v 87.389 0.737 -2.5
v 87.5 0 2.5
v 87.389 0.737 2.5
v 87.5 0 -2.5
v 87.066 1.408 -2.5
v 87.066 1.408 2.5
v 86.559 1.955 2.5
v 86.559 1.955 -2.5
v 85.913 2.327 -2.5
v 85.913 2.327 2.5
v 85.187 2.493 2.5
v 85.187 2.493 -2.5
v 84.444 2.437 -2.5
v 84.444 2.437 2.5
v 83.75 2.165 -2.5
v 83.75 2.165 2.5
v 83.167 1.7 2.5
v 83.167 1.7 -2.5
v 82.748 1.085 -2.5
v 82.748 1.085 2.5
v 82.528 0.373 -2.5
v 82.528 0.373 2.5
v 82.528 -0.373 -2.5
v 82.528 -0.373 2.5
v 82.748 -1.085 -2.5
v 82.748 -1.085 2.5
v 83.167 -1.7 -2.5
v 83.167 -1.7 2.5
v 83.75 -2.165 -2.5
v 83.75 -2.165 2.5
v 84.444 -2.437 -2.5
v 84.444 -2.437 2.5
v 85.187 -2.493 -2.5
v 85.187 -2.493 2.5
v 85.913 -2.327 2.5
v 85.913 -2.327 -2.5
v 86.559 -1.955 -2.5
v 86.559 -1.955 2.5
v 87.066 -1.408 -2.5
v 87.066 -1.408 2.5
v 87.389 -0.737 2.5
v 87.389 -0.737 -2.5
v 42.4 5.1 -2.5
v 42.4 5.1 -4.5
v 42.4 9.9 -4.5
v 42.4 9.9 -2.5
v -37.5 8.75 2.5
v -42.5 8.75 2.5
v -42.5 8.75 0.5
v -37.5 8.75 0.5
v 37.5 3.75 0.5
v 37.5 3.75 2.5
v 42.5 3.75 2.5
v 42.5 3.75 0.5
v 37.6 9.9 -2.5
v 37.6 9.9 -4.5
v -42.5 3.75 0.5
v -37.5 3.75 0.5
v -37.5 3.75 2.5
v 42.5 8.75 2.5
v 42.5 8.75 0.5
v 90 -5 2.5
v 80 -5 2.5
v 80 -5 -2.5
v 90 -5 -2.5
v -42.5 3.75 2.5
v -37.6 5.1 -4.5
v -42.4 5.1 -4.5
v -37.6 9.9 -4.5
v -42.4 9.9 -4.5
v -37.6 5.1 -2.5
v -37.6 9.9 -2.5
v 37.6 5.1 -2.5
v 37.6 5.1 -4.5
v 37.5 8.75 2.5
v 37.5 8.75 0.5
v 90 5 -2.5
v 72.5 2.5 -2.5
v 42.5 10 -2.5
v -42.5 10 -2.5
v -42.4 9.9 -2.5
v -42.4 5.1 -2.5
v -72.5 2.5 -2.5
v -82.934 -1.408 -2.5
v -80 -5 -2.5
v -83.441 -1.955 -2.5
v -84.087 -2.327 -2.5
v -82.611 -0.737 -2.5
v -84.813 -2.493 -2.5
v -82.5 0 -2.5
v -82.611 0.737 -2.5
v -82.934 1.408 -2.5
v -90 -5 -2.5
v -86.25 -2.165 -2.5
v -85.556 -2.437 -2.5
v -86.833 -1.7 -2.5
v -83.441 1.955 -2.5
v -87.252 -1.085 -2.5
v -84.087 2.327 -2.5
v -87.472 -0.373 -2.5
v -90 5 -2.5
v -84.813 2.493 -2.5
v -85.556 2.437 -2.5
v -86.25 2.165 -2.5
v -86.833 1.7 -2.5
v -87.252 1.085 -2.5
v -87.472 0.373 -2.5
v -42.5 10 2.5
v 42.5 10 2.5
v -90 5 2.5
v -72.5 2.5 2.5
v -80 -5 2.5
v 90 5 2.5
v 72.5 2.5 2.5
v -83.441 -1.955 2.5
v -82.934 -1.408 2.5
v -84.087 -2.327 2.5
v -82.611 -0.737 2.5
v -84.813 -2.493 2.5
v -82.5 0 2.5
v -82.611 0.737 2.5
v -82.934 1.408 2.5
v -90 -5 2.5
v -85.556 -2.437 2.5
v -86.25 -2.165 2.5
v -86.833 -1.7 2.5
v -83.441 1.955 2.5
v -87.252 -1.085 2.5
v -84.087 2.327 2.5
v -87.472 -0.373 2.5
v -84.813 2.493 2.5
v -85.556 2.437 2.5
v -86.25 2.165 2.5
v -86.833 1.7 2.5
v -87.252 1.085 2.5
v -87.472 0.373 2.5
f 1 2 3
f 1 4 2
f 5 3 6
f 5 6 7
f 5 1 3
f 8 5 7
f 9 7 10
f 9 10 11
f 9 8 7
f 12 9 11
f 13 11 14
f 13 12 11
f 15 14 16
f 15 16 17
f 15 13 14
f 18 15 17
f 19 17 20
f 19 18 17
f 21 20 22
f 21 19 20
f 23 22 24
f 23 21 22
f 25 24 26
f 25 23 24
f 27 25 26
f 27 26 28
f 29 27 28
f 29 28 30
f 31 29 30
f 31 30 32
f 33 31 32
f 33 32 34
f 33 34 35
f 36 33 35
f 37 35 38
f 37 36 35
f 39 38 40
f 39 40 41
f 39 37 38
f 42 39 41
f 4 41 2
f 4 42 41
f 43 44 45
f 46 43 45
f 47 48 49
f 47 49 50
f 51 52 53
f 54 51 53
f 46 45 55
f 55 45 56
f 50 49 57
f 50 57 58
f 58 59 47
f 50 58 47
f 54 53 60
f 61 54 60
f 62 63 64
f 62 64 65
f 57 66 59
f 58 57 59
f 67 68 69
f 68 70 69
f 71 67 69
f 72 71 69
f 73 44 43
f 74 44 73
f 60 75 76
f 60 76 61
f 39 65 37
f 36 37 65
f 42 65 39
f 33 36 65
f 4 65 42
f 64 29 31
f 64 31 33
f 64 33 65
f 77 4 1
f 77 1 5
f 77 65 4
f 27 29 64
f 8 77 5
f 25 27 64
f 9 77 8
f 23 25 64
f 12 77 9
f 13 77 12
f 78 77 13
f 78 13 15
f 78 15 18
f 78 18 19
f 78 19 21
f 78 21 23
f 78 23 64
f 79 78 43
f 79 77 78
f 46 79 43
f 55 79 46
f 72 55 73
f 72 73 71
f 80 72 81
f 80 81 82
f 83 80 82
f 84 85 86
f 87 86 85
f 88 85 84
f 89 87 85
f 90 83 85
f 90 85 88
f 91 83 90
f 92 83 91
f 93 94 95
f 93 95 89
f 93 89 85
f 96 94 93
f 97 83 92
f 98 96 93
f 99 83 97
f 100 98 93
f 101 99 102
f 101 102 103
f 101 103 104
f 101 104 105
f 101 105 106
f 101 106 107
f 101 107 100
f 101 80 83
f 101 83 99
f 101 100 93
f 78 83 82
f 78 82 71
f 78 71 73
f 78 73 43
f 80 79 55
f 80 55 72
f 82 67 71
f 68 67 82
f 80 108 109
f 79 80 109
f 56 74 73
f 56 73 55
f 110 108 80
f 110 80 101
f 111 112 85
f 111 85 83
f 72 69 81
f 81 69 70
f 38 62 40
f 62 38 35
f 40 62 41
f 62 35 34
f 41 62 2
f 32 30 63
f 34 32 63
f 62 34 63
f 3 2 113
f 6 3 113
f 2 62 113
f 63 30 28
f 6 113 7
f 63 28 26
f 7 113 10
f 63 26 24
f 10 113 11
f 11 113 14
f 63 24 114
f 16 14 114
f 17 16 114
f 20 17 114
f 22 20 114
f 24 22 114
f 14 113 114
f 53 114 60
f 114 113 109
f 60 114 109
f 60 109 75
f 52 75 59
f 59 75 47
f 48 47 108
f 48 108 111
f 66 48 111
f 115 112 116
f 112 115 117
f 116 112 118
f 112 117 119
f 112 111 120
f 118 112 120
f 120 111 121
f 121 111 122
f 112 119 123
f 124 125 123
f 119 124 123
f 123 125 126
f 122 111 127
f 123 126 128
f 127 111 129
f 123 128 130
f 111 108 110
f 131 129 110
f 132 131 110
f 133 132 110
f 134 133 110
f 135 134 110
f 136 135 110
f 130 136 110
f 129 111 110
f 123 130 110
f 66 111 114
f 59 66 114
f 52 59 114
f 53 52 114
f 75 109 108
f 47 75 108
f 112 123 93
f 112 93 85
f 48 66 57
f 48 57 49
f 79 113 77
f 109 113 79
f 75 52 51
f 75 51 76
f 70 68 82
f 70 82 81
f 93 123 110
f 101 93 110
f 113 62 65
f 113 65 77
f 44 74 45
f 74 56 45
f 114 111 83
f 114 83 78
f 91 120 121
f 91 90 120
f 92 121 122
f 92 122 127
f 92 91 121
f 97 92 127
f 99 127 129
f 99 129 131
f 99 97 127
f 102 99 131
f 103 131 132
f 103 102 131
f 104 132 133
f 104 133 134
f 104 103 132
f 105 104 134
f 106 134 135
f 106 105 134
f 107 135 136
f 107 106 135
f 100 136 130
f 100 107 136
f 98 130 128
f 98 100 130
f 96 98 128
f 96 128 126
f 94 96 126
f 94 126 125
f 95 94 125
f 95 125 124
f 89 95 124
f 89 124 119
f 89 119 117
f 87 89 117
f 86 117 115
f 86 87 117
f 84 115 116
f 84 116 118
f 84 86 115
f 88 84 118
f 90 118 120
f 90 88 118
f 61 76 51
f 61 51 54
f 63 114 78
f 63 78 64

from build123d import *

# Parameters (mm, degrees)
SKETCH2_W           = 180
SKETCH2_H           = 10
SKETCH2_R           = 2.5
BOSS_EXTRUDE1_DEPTH = 2.5
SKETCH3_W           = 5
SKETCH3_H           = 5
BOSS_EXTRUDE2_DEPTH = 7
CHAMFER1_SIZE       = 5
SKETCH4_W           = 5
SKETCH4_H           = 5
SKETCH4_W_2         = 4.8
SKETCH4_H_2         = 4.8
CUT_EXTRUDE1_DEPTH  = 2
CUT_EXTRUDE2_DEPTH  = 91.824005637
BOSS_EXTRUDE3_DEPTH = 5
BOSS_EXTRUDE4_DEPTH = 5
SKETCH8_W           = 5
SKETCH8_H           = 5
CUT_EXTRUDE3_DEPTH  = 2


with BuildPart() as part:
    # Sketch2 → Boss-Extrude1 (new, symmetric)
    with BuildSketch(Plane.XY):
        Rectangle(SKETCH2_W, SKETCH2_H)
        with Locations((-85, 0)):
            Circle(SKETCH2_R, mode=Mode.SUBTRACT)
        with Locations((85, 0)):
            Circle(SKETCH2_R, mode=Mode.SUBTRACT)
    extrude(amount=BOSS_EXTRUDE1_DEPTH, both=True)

    # Sketch3 → Boss-Extrude2 (add)
    with BuildSketch(Plane.XY.offset(2.5)):
        with Locations((-40, 7.5)):
            Rectangle(SKETCH3_W, SKETCH3_H)
        with Locations((40, 7.5)):
            Rectangle(SKETCH3_W, SKETCH3_H)
    extrude(amount=-BOSS_EXTRUDE2_DEPTH)

    # Chamfer1
    chamfer1_edges = [part.edges().sort_by_distance(p)[0] for p in [
        (-37.5, 5, 0),
        (-42.5, 5, 0),
        (37.5, 5, 0),
        (42.5, 5, 0),
    ]]
    chamfer(chamfer1_edges, length=CHAMFER1_SIZE - 0.0001)  # a hair under: the kernel refuses the full size

    # Sketch4 → Cut-Extrude1 (cut)
    # profile 1 of 2: a face of its own
    with BuildSketch(Plane(origin=(0, 0, -4.5), x_dir=(-1, 0, 0), z_dir=(0, 0, -1))):
        with Locations((40, 7.5)):
            Rectangle(SKETCH4_W, SKETCH4_H)
        with Locations((40, 7.5)):
            Rectangle(SKETCH4_W_2, SKETCH4_H_2, mode=Mode.SUBTRACT)
    # profile 2 of 2: a face of its own
    with BuildSketch(Plane(origin=(0, 0, -4.5), x_dir=(-1, 0, 0), z_dir=(0, 0, -1))):
        with Locations((-40, 7.5)):
            Rectangle(SKETCH4_W, SKETCH4_H)
        with Locations((-40, 7.5)):
            Rectangle(SKETCH4_W_2, SKETCH4_H_2, mode=Mode.SUBTRACT)
    extrude(amount=-CUT_EXTRUDE1_DEPTH, mode=Mode.SUBTRACT)

    # Sketch5 → Cut-Extrude2 (cut, through all)
    with BuildSketch(Plane.XY.offset(2.5)):
        Polygon((-80, -5), (-72.5, 2.5), (72.5, 2.5), (80, -5), align=None)
    extrude(amount=-CUT_EXTRUDE2_DEPTH, mode=Mode.SUBTRACT)

    # Sketch6 → Boss-Extrude3 (add)
    with BuildSketch(Plane.XY.offset(2.5)):
        Polygon((-42.5, 10), (-90, 5), (-47.5, 5), align=None)
        Polygon((42.5, 10), (47.5, 5), (90, 5), align=None)
    extrude(amount=-BOSS_EXTRUDE3_DEPTH)

    # Sketch7 → Boss-Extrude4 (add)
    with BuildSketch(Plane.XY.offset(2.5)):
        Polygon((-37.5, 10), (37.5, 10), (32.5, 5), (-32.5, 5), align=None)
    extrude(amount=-BOSS_EXTRUDE4_DEPTH)

    # Sketch8 → Cut-Extrude3 (cut)
    with BuildSketch(Plane.XY.offset(2.5)):
        with Locations((-40, 6.25)):
            Rectangle(SKETCH8_W, SKETCH8_H)
        with Locations((40, 6.25)):
            Rectangle(SKETCH8_W, SKETCH8_H)
    extrude(amount=-CUT_EXTRUDE3_DEPTH, mode=Mode.SUBTRACT)


solid = part.part
